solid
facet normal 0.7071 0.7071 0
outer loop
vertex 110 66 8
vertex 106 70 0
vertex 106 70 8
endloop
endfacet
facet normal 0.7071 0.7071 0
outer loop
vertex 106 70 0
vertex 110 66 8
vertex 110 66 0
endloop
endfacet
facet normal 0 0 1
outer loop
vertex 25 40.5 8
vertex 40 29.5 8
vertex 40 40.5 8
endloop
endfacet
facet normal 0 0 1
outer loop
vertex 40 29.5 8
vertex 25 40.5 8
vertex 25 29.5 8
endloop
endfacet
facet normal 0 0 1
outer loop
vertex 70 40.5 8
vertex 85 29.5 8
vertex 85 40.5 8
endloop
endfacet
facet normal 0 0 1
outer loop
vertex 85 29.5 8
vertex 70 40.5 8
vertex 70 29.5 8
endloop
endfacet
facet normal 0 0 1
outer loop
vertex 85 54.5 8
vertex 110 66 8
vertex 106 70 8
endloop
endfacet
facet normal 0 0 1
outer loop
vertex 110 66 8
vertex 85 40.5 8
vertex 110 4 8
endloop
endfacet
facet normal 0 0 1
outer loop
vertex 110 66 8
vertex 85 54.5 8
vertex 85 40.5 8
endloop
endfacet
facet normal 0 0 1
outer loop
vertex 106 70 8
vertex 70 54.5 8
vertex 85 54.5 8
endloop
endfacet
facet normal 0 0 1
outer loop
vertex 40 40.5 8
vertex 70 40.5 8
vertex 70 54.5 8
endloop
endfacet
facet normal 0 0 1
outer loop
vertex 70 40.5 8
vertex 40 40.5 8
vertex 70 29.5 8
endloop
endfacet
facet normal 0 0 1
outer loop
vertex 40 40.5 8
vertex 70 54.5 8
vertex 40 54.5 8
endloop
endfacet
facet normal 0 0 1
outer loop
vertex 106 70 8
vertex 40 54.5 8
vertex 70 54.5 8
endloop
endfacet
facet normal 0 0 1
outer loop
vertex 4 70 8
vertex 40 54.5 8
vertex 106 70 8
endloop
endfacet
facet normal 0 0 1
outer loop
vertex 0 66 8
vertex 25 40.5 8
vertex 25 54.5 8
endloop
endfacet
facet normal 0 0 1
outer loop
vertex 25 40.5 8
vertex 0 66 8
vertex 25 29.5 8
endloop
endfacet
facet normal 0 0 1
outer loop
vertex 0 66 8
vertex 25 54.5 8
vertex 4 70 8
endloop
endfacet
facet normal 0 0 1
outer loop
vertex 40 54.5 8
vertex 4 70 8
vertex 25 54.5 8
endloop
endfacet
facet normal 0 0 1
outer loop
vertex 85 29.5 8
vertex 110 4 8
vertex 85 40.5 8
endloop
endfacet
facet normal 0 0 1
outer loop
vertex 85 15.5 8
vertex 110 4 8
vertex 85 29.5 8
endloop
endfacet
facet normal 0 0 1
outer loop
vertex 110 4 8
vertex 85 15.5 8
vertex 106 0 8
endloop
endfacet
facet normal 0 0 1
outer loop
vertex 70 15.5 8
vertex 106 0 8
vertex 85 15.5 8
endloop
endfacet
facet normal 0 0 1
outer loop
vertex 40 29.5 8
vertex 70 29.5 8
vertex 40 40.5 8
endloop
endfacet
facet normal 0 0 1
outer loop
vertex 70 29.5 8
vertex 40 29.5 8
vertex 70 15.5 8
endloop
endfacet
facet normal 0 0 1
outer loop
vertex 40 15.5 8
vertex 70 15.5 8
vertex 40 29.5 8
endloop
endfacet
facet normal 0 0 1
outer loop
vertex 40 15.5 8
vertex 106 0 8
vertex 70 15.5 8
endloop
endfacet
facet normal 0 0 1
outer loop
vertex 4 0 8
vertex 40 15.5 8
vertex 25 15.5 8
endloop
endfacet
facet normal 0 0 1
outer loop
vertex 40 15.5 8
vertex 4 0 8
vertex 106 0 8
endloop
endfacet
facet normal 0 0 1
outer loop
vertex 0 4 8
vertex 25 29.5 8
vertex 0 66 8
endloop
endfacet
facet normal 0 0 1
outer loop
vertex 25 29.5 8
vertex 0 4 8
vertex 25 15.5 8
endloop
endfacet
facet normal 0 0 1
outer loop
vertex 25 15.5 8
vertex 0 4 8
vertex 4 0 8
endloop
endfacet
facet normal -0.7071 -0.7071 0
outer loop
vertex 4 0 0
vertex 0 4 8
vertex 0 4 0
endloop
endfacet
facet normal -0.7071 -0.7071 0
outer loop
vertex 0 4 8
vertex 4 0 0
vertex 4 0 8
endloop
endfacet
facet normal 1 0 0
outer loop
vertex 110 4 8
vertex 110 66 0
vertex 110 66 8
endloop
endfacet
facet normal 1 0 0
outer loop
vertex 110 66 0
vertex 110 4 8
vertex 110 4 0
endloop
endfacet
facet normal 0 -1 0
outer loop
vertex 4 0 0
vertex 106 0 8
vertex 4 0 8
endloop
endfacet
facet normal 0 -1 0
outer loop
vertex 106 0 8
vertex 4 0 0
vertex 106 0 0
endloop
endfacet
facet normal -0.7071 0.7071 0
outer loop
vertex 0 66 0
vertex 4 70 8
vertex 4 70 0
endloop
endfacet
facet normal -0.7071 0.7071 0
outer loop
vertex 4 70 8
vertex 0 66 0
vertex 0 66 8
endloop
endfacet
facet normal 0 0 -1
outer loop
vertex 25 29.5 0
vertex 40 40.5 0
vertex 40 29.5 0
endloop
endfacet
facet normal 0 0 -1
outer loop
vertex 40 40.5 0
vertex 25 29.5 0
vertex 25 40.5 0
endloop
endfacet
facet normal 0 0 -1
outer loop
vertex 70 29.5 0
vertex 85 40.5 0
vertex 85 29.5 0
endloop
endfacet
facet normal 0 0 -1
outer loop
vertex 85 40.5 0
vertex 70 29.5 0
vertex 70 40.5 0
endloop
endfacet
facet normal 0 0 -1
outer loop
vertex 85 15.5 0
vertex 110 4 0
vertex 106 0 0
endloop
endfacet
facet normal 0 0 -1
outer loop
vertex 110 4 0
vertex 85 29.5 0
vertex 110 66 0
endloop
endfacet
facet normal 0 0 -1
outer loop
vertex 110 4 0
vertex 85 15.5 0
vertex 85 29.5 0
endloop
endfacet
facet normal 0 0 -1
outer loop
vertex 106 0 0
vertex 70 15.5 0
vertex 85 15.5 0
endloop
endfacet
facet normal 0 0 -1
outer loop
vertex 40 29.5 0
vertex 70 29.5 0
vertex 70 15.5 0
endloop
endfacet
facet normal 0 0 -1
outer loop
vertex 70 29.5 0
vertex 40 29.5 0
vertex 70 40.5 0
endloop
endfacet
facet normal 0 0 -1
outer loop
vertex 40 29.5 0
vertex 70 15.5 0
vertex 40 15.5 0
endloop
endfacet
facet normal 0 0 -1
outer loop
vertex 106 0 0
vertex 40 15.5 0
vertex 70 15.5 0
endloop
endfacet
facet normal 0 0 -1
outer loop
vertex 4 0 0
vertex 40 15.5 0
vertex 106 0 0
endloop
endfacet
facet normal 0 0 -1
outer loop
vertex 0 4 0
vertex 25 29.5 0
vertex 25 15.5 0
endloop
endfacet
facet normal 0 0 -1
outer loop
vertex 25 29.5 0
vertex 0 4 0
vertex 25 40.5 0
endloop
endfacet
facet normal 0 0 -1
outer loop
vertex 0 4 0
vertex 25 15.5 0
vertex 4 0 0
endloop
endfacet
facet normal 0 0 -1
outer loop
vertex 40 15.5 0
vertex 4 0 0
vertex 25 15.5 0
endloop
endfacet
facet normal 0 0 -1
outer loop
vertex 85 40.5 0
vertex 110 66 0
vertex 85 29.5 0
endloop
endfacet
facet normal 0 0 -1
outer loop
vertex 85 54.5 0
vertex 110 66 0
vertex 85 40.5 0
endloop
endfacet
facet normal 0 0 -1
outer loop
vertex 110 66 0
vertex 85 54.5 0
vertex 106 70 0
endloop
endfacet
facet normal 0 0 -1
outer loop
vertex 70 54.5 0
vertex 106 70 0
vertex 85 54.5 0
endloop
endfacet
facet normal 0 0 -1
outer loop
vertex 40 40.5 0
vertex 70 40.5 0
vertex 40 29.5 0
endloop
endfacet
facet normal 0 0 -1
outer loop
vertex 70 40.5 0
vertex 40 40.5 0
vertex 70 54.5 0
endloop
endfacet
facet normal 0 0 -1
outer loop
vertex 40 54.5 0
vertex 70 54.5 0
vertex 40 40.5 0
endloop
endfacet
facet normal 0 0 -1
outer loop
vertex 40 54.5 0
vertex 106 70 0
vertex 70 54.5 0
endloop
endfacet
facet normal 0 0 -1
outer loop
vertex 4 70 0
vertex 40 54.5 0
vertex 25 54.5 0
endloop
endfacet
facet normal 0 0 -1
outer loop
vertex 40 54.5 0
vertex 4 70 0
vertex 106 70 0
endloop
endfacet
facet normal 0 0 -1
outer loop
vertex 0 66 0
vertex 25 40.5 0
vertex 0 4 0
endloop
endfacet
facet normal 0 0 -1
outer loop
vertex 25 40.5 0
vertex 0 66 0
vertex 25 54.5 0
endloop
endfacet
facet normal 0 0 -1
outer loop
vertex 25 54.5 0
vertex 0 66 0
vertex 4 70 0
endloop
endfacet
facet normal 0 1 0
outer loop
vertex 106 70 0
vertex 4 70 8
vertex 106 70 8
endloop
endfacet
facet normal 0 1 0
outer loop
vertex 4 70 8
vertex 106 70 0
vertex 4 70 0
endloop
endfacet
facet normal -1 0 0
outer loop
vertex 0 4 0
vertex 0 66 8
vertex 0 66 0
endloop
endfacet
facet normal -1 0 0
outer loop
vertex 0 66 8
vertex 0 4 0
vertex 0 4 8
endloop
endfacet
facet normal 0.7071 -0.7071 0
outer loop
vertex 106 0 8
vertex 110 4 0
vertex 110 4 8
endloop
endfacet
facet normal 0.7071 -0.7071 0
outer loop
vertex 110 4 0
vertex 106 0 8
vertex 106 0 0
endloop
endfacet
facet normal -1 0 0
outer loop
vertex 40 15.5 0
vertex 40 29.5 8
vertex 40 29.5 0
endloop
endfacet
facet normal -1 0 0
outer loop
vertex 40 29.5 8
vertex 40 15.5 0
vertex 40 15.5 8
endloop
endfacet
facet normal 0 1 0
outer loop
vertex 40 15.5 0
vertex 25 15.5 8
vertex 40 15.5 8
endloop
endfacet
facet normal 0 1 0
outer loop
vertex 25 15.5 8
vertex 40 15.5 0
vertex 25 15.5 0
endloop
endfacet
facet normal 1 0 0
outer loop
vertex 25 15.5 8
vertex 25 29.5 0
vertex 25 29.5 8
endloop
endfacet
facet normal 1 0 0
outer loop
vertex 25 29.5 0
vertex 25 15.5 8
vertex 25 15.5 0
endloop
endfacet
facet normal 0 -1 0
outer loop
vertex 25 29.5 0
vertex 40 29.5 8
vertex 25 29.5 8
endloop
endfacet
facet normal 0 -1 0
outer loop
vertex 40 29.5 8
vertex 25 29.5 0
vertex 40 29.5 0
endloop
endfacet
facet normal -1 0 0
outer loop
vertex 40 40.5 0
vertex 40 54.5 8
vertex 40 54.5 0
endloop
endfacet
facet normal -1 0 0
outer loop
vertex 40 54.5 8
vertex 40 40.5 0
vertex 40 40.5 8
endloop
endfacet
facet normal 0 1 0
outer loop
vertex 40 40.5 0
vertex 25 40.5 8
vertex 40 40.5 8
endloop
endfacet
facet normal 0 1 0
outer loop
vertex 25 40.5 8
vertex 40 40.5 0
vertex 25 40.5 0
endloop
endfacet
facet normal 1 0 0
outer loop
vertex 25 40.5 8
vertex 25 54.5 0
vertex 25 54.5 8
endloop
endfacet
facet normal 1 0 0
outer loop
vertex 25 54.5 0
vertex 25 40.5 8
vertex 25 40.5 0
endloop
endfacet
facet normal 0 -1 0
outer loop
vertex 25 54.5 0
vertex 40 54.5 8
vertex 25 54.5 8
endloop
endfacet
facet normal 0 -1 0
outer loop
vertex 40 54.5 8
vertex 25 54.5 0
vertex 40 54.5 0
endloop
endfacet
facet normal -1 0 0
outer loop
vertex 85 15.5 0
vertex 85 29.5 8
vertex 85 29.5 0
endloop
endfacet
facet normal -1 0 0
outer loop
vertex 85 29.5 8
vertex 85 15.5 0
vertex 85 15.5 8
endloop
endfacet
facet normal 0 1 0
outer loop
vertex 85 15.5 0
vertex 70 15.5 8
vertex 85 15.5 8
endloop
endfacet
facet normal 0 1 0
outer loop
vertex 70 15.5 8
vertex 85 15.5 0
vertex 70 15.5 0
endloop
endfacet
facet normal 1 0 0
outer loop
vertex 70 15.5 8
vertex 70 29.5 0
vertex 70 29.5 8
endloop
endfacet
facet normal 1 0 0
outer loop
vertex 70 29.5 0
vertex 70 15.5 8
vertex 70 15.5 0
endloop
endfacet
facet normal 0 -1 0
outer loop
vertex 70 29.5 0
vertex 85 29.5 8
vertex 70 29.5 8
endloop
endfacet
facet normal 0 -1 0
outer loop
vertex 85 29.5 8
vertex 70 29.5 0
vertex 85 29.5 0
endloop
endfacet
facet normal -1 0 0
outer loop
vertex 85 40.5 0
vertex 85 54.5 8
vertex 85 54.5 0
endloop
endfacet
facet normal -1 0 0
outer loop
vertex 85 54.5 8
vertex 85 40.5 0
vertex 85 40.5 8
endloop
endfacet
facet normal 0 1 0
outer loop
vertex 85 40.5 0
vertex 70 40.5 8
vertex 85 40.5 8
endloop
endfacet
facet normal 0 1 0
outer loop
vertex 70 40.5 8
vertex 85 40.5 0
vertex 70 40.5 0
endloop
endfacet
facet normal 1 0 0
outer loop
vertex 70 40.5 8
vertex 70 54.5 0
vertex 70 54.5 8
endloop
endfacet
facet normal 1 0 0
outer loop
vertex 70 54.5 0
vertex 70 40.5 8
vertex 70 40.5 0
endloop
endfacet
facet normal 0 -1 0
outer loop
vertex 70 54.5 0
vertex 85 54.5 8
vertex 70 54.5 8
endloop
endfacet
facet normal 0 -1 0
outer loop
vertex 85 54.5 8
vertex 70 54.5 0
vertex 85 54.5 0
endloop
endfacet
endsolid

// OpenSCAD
$fn = 32;

// ----------------------------------------------------------------------
// Windowed plate: 4 voids, 110 x 70 x 8 mm
// ----------------------------------------------------------------------

// --- parameters (mm) ---
plate_l = 110;            // plate length, X
plate_w = 70;             // plate width, Y
plate_t = 8;              // plate thickness, Z
edge_margin = 10;         // wall from the plate edge to any window
win_l = 15;               // pocket length
win_w = 14;               // pocket width
pitch_x = 45;             // grid pitch along X
pitch_y = 25;             // grid pitch along Y
depth_1 = 8;              // depth of void 1 (full thickness = through)
depth_2 = 8;              // depth of void 2 (full thickness = through)
depth_3 = 8;              // depth of void 3 (full thickness = through)
depth_4 = 8;              // depth of void 4 (full thickness = through)
corner_c = 4;             // corner chamfer of the plate

profile = [[4, 0], [106, 0], [110, 4], [110, 66], [106, 70], [4, 70], [0, 66], [0, 4]];  // primary outline, 8 points, counter clockwise
void_1 = [[25, 15.5], [40, 15.5], [40, 29.5], [25, 29.5]];  // pocket at grid node 0,0, 4 points
void_2 = [[25, 40.5], [40, 40.5], [40, 54.5], [25, 54.5]];  // pocket at grid node 0,1, 4 points
void_3 = [[70, 15.5], [85, 15.5], [85, 29.5], [70, 29.5]];  // pocket at grid node 1,0, 4 points
void_4 = [[70, 40.5], [85, 40.5], [85, 54.5], [70, 54.5]];  // pocket at grid node 1,1, 4 points

// --- the one profile operation ---
difference() {
  linear_extrude(height = plate_t) polygon(points = profile);
  translate([0, 0, -1])
    linear_extrude(height = plate_t + 2) polygon(points = void_1);
  translate([0, 0, -1])
    linear_extrude(height = plate_t + 2) polygon(points = void_2);
  translate([0, 0, -1])
    linear_extrude(height = plate_t + 2) polygon(points = void_3);
  translate([0, 0, -1])
    linear_extrude(height = plate_t + 2) polygon(points = void_4);
}
